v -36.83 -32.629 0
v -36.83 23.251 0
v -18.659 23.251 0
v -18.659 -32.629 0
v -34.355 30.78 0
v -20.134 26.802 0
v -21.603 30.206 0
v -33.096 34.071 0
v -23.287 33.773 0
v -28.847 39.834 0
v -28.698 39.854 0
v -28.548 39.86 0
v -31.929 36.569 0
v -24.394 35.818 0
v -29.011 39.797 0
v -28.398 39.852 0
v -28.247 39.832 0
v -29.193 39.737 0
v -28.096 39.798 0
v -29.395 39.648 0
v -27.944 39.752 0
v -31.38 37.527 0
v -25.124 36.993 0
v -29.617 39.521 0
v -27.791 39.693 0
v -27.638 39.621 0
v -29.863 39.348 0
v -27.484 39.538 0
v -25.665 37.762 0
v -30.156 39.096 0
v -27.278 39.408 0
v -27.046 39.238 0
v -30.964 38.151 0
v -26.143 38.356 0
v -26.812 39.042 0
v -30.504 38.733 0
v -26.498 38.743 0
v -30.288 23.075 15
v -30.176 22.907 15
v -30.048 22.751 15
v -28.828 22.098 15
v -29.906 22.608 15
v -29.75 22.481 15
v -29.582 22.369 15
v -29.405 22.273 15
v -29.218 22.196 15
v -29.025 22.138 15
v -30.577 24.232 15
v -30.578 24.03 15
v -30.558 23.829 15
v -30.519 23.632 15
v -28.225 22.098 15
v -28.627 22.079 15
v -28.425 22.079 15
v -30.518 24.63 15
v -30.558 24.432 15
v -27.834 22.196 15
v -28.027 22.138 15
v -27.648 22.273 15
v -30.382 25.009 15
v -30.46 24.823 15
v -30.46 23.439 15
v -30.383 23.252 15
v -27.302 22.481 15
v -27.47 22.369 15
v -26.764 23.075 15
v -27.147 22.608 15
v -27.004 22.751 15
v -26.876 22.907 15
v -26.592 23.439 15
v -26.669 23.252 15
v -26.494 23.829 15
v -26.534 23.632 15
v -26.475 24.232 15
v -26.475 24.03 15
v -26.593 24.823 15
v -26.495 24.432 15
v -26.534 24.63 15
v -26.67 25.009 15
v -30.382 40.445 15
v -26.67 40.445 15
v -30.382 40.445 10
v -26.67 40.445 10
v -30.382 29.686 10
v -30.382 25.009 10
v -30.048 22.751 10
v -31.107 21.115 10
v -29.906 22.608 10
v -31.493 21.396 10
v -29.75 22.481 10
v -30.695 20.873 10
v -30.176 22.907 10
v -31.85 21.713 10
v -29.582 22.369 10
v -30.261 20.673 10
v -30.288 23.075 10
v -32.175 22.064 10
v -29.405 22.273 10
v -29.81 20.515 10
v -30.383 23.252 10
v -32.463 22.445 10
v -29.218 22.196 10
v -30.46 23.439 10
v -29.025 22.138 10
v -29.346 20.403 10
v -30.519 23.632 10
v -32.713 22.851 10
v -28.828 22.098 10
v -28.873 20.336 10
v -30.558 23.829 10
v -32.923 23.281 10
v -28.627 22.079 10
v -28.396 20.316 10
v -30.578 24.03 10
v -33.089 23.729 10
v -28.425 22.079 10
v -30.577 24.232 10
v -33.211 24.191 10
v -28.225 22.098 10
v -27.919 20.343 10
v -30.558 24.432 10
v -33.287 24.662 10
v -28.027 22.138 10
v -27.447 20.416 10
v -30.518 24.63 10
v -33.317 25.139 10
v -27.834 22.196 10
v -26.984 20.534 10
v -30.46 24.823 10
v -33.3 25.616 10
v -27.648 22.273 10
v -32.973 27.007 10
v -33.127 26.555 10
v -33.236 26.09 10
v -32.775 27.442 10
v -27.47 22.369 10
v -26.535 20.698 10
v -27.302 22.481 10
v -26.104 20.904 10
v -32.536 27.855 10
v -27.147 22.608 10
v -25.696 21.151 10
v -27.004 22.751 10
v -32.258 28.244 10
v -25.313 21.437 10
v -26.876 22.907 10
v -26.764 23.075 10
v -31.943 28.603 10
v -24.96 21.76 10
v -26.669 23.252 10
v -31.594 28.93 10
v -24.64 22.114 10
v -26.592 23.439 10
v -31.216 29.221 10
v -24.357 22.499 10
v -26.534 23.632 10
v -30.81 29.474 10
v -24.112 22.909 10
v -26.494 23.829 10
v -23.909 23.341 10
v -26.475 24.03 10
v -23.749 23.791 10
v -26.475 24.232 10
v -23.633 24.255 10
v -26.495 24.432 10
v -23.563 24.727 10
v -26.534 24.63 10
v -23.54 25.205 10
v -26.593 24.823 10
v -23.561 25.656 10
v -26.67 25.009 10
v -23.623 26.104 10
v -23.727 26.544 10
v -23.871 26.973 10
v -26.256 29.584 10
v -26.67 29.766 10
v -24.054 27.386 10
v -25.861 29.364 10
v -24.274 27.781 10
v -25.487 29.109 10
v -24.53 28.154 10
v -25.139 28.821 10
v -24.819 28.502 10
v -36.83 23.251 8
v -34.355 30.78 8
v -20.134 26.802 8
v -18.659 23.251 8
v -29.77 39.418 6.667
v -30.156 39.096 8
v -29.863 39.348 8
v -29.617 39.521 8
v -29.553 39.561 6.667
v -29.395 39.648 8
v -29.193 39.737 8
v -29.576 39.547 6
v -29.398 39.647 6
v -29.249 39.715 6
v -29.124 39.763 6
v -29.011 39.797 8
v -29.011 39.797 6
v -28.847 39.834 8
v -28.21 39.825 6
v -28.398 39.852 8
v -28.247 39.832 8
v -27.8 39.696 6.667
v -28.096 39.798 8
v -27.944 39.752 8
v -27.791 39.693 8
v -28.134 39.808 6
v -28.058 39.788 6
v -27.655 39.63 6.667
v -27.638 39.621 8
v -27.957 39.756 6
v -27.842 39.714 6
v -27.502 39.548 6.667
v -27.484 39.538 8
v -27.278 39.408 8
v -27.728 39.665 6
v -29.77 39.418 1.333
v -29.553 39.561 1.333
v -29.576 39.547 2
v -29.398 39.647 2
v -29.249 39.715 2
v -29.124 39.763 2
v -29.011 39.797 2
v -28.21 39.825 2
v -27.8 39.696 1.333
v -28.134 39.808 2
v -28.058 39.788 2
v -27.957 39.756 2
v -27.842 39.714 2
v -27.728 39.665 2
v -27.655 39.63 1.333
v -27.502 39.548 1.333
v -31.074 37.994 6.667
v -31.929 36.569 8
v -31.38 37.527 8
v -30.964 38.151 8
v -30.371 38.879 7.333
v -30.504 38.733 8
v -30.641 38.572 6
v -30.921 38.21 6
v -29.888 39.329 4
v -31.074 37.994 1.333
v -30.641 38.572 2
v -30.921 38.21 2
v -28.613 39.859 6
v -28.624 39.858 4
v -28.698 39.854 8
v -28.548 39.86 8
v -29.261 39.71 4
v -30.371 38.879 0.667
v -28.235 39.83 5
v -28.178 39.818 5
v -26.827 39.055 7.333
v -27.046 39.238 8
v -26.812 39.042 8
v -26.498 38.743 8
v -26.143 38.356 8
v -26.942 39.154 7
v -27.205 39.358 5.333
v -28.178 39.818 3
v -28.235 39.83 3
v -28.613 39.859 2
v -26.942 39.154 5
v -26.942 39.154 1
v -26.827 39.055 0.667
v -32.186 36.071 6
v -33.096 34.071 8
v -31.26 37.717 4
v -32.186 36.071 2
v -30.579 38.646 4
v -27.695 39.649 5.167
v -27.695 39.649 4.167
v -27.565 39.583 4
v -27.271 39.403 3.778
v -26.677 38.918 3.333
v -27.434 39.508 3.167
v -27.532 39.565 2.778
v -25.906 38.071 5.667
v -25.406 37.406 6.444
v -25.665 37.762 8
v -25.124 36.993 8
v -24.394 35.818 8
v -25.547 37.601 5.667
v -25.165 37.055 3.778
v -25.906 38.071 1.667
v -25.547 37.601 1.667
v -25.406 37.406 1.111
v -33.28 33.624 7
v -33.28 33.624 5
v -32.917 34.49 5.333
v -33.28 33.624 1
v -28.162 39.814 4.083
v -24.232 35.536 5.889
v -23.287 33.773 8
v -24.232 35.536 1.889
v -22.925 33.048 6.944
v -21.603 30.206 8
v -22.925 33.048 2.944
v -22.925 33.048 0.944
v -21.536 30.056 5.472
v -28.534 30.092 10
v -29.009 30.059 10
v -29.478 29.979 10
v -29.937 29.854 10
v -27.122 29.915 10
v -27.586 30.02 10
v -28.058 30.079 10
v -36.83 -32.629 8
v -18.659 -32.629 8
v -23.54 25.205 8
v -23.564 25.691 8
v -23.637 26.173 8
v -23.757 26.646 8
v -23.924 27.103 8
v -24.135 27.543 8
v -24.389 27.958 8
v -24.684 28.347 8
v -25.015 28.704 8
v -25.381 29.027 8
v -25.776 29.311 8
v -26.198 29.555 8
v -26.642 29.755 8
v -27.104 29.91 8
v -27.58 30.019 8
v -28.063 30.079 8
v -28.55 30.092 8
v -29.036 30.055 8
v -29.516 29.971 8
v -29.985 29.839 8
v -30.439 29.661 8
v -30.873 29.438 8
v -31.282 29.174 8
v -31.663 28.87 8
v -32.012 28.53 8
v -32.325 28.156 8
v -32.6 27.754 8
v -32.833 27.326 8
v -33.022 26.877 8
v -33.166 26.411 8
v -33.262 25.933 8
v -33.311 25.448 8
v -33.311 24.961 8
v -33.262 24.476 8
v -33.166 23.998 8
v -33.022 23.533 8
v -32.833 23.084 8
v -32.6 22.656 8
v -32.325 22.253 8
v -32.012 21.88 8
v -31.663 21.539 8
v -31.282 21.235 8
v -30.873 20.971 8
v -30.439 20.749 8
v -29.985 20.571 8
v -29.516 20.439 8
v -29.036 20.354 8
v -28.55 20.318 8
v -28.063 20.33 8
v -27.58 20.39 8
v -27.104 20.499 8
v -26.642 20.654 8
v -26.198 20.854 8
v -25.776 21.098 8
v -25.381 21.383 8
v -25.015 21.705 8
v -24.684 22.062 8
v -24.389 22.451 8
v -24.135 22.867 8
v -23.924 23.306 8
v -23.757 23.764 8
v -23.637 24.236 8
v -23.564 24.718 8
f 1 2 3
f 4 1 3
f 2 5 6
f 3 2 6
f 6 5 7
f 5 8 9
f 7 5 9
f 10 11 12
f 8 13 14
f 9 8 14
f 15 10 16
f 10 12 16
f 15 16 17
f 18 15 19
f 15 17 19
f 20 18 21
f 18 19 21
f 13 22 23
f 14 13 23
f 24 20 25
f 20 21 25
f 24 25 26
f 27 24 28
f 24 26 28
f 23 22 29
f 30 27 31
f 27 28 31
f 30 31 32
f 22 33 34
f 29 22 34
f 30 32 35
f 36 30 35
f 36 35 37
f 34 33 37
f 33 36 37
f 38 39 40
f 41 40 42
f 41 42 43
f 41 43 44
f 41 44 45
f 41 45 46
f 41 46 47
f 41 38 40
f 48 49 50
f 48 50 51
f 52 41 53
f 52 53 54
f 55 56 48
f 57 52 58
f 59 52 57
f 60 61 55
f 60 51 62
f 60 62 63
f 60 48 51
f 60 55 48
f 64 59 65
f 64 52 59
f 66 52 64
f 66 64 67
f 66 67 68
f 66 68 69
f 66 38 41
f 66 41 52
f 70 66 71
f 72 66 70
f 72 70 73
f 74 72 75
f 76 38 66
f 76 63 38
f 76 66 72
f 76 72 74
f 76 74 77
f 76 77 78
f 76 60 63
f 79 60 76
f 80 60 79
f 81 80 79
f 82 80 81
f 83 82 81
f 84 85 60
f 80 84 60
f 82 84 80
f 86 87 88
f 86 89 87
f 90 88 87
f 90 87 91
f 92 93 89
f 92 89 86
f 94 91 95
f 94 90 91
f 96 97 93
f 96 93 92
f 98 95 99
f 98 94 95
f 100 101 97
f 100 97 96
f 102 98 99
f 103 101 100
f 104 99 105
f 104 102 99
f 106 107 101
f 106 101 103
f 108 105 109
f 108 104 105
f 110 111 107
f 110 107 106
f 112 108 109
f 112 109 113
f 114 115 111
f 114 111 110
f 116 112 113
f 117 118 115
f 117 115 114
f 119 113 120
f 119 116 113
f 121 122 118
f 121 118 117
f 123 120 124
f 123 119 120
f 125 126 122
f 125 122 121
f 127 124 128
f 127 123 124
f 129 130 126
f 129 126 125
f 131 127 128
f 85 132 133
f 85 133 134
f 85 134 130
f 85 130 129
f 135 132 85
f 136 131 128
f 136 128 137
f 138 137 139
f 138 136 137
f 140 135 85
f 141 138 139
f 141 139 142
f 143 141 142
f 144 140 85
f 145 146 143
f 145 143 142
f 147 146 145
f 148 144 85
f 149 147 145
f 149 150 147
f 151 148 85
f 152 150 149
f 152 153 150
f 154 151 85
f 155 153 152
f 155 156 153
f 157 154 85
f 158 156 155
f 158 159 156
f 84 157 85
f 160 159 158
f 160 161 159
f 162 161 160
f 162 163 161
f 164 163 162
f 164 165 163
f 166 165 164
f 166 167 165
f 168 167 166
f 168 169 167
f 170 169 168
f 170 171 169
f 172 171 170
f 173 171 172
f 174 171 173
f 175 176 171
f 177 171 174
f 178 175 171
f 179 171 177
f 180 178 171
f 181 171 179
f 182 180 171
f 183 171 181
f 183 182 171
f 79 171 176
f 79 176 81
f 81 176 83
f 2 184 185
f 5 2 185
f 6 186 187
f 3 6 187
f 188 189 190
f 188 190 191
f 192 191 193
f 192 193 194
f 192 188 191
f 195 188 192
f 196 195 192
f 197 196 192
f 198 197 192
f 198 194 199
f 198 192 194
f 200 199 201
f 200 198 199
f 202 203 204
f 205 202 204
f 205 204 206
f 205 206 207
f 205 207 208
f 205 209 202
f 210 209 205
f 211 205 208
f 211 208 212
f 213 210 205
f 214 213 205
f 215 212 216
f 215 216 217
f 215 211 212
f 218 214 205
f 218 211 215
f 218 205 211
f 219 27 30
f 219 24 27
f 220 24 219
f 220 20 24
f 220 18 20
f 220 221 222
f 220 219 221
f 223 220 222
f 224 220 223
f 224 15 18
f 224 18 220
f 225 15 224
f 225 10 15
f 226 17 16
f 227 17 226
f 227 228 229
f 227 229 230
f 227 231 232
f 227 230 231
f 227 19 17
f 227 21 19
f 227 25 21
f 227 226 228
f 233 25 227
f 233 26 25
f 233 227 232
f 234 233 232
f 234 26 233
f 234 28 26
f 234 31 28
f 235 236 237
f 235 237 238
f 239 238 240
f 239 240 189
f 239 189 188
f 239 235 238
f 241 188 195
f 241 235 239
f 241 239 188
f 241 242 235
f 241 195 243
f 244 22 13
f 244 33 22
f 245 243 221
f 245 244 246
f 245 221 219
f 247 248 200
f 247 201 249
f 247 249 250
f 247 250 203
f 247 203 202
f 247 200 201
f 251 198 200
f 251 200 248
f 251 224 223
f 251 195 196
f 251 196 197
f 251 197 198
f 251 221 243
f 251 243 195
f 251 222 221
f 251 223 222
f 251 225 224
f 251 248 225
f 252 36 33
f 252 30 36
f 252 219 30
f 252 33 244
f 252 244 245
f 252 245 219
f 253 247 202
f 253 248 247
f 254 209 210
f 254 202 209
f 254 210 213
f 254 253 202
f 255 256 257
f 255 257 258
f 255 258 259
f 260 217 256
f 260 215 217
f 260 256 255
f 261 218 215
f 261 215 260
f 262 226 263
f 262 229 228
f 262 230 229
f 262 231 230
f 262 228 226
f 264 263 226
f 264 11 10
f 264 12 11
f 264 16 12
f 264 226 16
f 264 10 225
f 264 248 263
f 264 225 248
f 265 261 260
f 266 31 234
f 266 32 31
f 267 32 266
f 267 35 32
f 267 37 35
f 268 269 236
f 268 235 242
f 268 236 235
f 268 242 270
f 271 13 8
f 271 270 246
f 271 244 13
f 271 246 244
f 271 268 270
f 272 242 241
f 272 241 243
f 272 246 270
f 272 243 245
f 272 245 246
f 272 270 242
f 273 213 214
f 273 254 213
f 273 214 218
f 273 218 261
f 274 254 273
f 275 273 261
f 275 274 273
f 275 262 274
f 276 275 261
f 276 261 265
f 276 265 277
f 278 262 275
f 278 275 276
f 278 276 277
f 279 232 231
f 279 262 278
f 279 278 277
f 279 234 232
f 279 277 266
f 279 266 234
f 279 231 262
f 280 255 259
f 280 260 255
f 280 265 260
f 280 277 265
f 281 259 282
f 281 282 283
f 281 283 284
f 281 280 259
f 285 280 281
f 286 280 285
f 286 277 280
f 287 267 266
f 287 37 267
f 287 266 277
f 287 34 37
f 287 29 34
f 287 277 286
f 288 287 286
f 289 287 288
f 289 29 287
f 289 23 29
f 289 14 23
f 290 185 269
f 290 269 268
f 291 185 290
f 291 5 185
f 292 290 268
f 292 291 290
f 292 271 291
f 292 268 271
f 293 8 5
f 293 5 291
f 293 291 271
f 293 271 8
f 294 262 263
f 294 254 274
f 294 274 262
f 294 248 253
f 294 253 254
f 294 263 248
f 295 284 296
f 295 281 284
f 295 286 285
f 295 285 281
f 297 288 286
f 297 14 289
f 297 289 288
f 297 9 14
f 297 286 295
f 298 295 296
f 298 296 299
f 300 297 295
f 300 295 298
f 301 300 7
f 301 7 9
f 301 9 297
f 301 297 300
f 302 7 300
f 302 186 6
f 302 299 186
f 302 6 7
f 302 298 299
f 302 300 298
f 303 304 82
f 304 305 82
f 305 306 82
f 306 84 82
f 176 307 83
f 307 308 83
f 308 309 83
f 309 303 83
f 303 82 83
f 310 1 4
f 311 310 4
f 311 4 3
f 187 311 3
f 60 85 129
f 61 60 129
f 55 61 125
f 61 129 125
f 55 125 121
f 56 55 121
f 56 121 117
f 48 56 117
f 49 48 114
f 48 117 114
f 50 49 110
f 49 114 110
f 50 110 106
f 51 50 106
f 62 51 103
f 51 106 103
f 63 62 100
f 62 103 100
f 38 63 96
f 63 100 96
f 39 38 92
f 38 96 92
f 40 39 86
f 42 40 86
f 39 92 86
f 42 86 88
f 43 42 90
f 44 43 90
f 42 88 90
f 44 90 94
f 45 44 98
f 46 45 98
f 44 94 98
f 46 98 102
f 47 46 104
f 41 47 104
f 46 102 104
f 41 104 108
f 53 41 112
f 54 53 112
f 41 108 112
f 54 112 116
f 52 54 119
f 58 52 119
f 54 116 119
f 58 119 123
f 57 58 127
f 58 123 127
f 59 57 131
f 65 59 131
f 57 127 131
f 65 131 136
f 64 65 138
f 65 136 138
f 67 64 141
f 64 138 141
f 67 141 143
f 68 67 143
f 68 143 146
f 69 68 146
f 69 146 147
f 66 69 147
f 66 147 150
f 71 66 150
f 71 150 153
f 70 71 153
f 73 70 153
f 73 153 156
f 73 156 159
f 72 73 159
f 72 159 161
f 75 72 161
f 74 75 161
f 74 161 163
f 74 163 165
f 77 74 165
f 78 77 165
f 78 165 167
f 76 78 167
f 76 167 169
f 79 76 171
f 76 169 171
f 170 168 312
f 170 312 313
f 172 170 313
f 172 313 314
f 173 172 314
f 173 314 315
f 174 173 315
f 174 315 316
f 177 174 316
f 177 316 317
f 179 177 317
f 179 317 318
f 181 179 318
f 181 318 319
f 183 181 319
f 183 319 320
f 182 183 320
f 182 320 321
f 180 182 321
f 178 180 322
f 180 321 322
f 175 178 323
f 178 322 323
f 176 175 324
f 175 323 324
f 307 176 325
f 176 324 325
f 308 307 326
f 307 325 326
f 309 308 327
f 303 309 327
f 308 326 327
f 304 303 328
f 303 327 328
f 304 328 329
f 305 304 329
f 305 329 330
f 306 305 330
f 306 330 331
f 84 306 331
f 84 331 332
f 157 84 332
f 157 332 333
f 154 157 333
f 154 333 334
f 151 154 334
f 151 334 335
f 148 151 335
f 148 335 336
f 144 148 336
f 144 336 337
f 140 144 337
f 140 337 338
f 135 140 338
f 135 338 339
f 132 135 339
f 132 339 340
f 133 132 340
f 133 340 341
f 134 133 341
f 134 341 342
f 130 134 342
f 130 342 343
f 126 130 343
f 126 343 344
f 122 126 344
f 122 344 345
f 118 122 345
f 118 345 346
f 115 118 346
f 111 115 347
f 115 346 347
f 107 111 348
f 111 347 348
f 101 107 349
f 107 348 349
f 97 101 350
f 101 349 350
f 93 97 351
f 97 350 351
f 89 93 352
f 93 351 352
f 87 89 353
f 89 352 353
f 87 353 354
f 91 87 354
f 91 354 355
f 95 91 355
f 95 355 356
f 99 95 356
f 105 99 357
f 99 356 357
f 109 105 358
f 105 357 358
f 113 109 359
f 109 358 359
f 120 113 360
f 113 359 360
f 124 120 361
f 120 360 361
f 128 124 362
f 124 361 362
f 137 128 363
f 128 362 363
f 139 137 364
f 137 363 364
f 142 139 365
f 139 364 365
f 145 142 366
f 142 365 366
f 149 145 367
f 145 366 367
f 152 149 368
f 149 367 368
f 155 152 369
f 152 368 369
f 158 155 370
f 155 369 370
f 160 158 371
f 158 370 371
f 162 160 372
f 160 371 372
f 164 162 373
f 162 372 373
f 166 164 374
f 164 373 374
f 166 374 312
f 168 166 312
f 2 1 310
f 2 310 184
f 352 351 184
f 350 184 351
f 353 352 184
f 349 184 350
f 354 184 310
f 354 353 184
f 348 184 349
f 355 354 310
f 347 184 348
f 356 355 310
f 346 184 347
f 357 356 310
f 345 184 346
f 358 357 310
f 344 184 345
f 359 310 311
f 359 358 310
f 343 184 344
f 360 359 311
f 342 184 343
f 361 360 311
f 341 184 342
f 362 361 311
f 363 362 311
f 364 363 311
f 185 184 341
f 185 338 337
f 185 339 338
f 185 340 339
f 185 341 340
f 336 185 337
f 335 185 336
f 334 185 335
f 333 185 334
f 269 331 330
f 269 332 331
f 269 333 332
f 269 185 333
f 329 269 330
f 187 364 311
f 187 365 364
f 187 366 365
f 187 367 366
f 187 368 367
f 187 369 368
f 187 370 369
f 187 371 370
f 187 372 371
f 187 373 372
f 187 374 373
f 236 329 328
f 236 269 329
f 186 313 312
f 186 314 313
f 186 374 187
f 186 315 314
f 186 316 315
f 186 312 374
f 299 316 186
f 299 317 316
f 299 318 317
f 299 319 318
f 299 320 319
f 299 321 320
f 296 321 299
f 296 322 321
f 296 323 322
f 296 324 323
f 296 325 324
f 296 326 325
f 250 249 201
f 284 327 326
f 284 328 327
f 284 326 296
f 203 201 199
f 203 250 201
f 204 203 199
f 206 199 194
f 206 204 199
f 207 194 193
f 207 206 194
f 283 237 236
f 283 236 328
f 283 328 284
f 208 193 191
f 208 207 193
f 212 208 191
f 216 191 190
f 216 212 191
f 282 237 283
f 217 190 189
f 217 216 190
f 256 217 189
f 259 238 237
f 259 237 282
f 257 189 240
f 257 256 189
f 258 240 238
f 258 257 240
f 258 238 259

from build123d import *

# Parameters (mm, degrees)
F0_W     = 18.1707702577
F0_H     = 55.8800026774
F1_DEPTH = 8
F2_R     = 4.8885197861
F3_DEPTH = 2
F4_W     = 3.7123076618
F4_H     = 15.4353883117
F5_DEPTH = 5


with BuildPart() as f1:
    # F0 (on Top) → F1 (new body)
    with BuildSketch(Plane.XY):
        with Locations((-27.7446154505, -4.6892315149)):
            Rectangle(F0_W, F0_H)
        with BuildLine():
            add(Edge.make_bspline(
                [(-36.8300005794, 23.2507698238), (-34.2214483668, 31.493687892), (-28.9456329612, 48.1650483199), (-22.1133750602, 31.6169136543), (-18.6592303216, 23.2507698238)],
                knots=[0, 0, 0, 0, 0.4944358383, 1, 1, 1, 1], degree=3))
            Line((-36.8300005794, 23.2507698238), (-18.6592303216, 23.2507698238))
        make_face()
    extrude(amount=F1_DEPTH)

    # F2 (on face) → F3 (join)
    with BuildSketch(Plane.XY.offset(8)):
        with Locations((-28.4284614027, 25.2046156675)):
            Circle(F2_R)
    extrude(amount=F3_DEPTH)

    # F4 (on face) → F5 (join)
    with BuildSketch(Plane.XY.offset(10)):
        with Locations((-28.5261552781, 32.7269257978)):
            Rectangle(F4_W, F4_H)
        with BuildLine():
            Line((-26.6700014472, 25.0092316419), (-30.382309109, 25.0092316419))
            ThreePointArc((-30.382309109, 25.0092316419), (-28.5261552781, 22.07613801), (-26.6700014472, 25.0092316419))
        make_face()
    extrude(amount=F5_DEPTH)


solid = f1.part
